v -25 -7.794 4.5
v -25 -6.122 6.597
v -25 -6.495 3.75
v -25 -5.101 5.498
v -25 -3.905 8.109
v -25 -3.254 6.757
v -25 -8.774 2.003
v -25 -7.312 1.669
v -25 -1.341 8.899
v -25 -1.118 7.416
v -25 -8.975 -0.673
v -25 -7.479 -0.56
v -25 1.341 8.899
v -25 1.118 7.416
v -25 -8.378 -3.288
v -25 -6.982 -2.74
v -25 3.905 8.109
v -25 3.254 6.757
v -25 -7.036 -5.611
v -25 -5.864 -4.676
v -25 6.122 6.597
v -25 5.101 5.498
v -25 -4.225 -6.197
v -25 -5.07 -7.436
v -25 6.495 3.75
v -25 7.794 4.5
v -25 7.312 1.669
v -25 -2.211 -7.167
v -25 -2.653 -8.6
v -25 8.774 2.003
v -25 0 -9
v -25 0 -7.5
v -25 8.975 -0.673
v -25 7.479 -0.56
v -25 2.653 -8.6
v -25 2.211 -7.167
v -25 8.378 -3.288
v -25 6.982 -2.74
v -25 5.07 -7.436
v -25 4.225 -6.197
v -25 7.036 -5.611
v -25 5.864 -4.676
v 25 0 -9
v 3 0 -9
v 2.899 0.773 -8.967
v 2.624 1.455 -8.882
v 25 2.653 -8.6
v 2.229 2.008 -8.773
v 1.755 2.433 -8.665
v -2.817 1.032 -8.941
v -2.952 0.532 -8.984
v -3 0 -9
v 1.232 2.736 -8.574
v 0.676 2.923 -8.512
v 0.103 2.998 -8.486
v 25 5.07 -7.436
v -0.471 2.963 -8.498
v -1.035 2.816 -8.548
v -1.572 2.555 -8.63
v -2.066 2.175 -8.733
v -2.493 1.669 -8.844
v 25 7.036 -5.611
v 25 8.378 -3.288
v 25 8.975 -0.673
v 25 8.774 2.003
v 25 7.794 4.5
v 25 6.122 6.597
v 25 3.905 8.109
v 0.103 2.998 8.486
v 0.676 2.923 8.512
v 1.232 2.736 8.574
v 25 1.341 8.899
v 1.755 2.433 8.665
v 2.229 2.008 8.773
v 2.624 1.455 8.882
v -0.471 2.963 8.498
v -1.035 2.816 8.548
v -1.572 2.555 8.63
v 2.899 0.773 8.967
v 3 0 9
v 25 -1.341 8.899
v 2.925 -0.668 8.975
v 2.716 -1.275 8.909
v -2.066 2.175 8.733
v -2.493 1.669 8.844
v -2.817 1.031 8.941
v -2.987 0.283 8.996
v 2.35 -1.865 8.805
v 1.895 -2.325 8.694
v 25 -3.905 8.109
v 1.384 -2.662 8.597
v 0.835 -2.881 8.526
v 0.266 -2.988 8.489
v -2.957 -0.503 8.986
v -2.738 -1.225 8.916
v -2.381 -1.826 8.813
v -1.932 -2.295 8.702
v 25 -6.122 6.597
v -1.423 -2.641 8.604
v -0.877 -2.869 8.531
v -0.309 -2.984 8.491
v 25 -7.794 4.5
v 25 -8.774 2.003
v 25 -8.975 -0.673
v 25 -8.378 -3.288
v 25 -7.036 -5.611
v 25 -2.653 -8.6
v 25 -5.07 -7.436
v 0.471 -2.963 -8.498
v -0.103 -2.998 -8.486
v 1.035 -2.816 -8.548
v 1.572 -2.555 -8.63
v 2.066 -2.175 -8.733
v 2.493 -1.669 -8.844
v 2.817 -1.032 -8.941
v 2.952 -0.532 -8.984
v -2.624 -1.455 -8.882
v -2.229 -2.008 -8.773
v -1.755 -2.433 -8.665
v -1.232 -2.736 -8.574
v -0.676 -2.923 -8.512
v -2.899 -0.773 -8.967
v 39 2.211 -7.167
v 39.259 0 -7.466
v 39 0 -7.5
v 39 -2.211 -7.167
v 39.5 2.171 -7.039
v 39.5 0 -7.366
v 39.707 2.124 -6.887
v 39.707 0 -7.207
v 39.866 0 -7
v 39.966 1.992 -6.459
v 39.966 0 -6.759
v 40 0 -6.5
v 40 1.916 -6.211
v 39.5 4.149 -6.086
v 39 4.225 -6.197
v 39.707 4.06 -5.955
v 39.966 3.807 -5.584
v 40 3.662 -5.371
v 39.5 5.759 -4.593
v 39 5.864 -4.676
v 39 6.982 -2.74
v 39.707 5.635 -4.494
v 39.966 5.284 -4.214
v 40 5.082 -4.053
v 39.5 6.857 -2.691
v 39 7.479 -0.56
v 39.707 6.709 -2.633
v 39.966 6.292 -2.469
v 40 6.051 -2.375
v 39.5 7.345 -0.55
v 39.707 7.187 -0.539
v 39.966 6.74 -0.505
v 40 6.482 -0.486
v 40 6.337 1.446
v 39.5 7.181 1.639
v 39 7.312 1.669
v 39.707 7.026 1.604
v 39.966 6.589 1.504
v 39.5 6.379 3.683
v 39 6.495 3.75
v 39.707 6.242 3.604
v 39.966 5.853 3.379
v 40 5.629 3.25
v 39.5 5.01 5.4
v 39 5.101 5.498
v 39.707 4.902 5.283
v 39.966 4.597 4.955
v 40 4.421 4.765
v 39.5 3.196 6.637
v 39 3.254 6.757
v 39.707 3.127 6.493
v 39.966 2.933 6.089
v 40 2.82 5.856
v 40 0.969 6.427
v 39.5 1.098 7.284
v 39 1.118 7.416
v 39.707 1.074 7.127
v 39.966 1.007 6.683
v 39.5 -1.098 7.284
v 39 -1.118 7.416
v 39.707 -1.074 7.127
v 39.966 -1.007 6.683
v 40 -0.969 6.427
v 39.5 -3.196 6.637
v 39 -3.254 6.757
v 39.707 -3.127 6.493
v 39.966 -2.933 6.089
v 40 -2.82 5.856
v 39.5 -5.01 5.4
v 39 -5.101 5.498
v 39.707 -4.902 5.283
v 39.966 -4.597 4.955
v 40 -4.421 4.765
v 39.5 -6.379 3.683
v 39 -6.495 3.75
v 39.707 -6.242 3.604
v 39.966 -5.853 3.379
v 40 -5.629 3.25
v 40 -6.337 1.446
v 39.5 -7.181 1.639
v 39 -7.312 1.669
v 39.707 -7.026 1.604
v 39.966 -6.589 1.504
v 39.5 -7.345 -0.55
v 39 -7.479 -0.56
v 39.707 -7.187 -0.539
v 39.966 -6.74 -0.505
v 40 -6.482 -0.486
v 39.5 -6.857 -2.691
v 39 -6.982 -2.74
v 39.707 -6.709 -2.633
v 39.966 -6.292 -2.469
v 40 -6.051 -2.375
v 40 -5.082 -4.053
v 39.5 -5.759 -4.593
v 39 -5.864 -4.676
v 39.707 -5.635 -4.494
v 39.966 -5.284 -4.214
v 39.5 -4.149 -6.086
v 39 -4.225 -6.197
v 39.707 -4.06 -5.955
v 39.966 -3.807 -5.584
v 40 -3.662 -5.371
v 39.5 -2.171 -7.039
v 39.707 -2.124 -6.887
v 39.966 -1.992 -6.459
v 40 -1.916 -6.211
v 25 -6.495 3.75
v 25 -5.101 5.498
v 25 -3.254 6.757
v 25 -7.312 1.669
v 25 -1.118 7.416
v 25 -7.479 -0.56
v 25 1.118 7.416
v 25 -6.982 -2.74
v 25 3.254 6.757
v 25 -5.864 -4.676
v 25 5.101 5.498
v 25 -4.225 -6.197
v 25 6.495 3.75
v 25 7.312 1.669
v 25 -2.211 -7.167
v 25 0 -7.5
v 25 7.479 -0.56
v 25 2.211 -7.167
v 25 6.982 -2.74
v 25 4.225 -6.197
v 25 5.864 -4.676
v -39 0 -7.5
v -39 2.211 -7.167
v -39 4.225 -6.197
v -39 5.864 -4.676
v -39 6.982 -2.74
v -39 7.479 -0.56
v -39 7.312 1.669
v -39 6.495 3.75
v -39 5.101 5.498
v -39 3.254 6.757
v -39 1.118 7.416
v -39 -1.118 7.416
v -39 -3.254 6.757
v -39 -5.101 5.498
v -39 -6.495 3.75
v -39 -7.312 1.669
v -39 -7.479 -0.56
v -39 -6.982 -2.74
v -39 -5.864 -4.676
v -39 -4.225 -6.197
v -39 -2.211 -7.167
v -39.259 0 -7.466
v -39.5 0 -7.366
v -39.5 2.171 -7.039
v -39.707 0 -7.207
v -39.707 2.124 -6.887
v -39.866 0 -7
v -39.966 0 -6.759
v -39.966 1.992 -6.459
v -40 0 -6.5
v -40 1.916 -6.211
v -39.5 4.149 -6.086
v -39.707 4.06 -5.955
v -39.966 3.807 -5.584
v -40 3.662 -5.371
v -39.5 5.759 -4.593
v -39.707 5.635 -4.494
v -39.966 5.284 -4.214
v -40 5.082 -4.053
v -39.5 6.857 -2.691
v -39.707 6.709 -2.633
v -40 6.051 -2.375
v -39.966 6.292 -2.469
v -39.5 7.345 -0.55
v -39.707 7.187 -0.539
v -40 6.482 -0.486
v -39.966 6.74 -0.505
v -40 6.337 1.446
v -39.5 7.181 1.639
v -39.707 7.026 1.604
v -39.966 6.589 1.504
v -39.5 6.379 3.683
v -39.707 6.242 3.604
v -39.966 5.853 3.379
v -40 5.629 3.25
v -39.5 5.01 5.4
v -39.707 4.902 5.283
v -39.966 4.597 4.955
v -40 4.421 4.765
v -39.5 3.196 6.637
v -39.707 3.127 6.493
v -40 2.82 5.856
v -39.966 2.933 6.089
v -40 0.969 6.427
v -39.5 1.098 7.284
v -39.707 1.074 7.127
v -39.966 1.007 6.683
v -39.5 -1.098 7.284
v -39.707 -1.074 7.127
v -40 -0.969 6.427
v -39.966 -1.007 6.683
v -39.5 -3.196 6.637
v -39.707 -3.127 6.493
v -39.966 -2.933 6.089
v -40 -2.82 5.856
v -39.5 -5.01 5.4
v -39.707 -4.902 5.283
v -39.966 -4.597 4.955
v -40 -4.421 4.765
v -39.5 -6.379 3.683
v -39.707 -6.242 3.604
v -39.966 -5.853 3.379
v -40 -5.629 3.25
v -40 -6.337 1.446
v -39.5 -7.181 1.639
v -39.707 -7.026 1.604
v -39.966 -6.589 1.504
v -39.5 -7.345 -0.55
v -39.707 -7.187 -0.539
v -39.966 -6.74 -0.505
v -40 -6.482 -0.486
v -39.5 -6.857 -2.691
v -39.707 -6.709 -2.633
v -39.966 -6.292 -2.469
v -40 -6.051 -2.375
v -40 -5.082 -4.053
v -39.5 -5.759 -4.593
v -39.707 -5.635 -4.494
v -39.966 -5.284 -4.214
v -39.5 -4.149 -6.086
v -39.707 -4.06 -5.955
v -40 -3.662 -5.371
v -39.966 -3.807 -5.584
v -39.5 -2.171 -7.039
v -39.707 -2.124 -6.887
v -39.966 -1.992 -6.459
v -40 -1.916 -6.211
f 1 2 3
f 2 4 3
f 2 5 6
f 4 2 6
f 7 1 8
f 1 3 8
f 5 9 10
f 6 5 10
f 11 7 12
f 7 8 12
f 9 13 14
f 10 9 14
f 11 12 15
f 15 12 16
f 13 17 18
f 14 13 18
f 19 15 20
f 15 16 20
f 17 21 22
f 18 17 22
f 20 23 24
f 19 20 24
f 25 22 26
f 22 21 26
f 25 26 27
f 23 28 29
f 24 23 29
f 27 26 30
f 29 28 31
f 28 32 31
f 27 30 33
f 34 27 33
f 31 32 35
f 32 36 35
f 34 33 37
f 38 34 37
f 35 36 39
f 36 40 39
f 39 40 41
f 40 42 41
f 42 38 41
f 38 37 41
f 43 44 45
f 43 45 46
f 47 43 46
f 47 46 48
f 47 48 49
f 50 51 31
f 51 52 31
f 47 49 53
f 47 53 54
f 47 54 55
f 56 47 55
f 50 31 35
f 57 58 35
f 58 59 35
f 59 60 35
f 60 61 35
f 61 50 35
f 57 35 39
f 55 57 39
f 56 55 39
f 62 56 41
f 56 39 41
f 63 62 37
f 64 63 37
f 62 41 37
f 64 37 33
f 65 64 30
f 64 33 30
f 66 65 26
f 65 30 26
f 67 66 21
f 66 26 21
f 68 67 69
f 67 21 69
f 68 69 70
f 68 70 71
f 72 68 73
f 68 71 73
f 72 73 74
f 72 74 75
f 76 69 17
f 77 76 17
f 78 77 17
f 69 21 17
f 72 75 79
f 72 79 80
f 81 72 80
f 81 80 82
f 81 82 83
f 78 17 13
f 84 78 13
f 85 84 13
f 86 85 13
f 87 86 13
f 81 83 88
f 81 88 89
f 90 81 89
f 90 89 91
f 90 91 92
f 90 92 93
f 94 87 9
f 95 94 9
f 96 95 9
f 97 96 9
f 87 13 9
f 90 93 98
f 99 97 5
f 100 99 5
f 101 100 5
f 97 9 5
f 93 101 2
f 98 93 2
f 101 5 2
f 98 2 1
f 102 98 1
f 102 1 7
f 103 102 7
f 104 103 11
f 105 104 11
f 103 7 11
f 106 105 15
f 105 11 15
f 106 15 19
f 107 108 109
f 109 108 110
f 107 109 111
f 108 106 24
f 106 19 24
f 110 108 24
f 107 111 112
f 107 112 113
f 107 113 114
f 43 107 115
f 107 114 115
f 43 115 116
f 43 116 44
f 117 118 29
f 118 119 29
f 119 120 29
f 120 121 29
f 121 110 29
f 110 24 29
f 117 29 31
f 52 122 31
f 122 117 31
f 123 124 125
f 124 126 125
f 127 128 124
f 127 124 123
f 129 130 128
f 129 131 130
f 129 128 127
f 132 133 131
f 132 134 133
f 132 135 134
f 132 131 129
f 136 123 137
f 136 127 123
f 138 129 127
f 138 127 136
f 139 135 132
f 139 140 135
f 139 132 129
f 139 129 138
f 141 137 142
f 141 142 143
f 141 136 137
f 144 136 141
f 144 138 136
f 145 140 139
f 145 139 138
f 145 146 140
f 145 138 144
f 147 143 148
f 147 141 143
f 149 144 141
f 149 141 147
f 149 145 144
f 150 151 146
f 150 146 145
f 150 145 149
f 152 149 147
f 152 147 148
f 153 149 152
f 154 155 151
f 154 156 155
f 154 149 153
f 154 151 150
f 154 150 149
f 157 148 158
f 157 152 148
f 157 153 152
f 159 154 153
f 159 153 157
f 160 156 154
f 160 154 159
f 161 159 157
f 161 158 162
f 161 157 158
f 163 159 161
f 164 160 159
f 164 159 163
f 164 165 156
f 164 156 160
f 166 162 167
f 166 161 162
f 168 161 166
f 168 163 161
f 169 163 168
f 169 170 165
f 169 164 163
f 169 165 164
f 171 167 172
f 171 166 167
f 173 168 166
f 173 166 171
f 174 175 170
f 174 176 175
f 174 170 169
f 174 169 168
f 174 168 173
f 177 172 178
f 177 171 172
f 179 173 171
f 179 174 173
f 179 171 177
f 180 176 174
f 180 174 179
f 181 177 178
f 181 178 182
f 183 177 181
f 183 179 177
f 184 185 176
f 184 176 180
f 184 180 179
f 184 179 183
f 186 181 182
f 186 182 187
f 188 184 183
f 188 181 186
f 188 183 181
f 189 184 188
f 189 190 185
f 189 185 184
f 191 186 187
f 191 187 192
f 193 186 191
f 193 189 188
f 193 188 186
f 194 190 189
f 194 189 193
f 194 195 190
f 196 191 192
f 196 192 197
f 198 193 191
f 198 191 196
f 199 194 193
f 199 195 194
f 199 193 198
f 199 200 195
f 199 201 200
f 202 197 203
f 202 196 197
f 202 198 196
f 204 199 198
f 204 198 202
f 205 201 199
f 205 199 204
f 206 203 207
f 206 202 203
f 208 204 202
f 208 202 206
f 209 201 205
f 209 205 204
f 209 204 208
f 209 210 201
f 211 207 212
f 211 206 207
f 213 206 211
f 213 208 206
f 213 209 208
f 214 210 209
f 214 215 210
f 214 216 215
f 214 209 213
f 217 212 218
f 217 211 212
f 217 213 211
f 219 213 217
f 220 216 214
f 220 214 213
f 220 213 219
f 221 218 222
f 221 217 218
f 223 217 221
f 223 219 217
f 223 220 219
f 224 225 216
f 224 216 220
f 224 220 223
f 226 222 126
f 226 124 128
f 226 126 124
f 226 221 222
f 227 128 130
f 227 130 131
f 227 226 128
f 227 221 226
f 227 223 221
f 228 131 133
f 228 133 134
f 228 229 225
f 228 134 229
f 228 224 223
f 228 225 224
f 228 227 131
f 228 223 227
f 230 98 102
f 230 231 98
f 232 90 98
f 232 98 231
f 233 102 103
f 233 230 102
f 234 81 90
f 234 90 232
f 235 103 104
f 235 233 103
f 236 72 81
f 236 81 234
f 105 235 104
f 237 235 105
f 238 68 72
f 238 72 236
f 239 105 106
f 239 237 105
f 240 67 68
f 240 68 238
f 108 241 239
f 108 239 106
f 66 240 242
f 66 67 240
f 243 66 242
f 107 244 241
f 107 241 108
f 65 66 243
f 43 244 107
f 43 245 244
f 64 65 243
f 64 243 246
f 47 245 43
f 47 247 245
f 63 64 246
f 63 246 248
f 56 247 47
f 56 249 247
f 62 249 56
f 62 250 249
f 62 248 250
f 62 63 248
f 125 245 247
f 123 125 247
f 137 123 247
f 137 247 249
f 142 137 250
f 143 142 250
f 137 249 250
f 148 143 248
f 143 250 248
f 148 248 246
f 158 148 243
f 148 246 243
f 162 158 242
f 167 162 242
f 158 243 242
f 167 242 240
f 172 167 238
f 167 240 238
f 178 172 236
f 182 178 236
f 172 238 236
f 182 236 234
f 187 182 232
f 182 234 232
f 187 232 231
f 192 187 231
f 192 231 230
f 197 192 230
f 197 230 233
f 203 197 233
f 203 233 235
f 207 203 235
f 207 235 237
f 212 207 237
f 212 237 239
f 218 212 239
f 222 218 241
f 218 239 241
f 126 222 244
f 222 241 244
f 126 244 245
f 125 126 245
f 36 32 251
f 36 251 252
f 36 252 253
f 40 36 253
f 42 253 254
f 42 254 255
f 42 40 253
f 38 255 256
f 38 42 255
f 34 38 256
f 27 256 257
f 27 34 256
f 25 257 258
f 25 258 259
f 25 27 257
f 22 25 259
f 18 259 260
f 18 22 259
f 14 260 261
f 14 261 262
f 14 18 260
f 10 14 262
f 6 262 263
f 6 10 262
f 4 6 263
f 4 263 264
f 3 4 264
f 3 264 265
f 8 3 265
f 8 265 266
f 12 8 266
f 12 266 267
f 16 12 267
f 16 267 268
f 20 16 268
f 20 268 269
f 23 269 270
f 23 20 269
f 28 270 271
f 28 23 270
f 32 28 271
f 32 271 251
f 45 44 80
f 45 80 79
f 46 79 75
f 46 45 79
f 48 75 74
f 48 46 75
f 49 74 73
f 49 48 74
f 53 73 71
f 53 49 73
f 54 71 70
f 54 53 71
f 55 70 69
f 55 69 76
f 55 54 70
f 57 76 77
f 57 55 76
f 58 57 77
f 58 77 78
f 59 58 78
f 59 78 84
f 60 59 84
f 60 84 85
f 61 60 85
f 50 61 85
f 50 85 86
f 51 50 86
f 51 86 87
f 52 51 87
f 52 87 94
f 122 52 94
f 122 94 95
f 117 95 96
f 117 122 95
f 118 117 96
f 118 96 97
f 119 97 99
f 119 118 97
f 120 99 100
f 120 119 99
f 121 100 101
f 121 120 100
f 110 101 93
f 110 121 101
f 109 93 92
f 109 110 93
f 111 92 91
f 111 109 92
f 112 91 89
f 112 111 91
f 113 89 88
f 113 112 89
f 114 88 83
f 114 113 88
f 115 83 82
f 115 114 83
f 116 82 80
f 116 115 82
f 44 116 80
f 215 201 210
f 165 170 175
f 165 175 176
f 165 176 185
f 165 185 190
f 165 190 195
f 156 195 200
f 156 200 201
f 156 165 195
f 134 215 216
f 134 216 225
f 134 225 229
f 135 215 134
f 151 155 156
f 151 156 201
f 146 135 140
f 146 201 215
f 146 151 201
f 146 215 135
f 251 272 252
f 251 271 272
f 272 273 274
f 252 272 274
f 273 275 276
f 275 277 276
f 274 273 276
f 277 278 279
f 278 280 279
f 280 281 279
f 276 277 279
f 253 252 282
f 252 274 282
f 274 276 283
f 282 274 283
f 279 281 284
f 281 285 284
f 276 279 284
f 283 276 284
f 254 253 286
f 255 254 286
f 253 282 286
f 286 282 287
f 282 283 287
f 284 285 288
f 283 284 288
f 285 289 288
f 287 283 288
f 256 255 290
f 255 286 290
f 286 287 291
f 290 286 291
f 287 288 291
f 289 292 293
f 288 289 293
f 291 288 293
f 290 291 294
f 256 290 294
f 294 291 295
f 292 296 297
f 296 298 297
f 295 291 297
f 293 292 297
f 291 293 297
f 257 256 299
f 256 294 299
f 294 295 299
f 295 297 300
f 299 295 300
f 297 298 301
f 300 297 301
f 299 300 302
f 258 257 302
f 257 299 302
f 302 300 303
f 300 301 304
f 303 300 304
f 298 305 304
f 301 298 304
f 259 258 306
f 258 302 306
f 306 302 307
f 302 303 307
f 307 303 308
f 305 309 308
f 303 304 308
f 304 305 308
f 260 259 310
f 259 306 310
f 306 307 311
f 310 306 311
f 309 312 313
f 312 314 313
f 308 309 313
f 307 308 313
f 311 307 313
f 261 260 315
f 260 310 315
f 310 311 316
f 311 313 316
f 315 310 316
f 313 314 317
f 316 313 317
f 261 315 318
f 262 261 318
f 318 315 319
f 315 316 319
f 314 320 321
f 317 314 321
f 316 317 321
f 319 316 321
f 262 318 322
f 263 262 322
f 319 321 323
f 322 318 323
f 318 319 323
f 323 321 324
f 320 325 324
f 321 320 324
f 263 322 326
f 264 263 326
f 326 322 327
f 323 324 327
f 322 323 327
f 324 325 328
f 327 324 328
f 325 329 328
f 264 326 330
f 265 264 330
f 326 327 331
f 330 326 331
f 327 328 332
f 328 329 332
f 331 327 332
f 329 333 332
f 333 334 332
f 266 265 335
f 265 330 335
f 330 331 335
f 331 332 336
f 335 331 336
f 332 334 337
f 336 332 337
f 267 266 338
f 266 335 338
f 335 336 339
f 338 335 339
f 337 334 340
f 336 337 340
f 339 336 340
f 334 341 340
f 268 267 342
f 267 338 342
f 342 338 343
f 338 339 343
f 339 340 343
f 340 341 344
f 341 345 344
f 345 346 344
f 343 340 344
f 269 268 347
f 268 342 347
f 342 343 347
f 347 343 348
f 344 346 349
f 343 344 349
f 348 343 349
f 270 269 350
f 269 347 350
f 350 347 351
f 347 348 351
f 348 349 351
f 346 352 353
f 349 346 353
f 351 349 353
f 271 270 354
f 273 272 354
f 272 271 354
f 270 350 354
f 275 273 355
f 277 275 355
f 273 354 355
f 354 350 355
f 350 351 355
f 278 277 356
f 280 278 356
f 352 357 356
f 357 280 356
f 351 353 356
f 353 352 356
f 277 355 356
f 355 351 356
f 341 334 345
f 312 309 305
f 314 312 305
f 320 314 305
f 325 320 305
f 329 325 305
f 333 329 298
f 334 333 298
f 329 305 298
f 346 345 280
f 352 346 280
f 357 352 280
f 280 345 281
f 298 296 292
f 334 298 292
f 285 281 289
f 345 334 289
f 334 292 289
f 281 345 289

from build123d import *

# Parameters (mm, degrees)
BOSS_EXTRUDE2_DEPTH      = 25
BOSS_EXTRUDE2_DEPTH_BACK = 25
SKETCH1_R                = 9
SKETCH2_R                = 7.5
BOSS_EXTRUDE3_DEPTH      = 15
FILLET2_R                = 1
CUT_EXTRUDE1_DEPTH       = 42.976183724
CUT_EXTRUDE1_DEPTH_BACK  = 42.976183724
SKETCH3_R                = 3


with BuildPart() as part:
    # Sketch1 → Boss-Extrude2 (new, two sides: drawn at the far end of the back side and taken through both)
    with BuildSketch(Plane(origin=(0, 0, 0), x_dir=(0, 0, -1), z_dir=(1, 0, 0)).offset(-BOSS_EXTRUDE2_DEPTH_BACK)):
        Circle(SKETCH1_R)
    extrude(amount=BOSS_EXTRUDE2_DEPTH + BOSS_EXTRUDE2_DEPTH_BACK)

    # Sketch2 → Boss-Extrude3 (add)
    with BuildSketch(Plane(origin=(25, 0, 0), x_dir=(0, 0, -1), z_dir=(1, 0, 0))):
        Circle(SKETCH2_R)
    boss_extrude3 = extrude(amount=BOSS_EXTRUDE3_DEPTH)

    # Mirror1: Boss-Extrude3 across plane
    add(boss_extrude3.mirror(Plane(origin=(0, 0, 0), x_dir=(0, 0, 1), z_dir=(1, 0, 0))))

    # Fillet2
    fillet2_edges = [part.edges().sort_by_distance(p)[0] for p in [
        (-40, 0, 7.5),
        (40, 0, 7.5),
    ]]
    fillet(fillet2_edges, radius=FILLET2_R)

    # Sketch3 → Cut-Extrude1 (cut, two sides: drawn at the far end of the back side and taken through both)
    with BuildSketch(Plane.XY.offset(-CUT_EXTRUDE1_DEPTH_BACK)):
        Circle(SKETCH3_R)
    extrude(amount=CUT_EXTRUDE1_DEPTH + CUT_EXTRUDE1_DEPTH_BACK, mode=Mode.SUBTRACT)


solid = part.part
